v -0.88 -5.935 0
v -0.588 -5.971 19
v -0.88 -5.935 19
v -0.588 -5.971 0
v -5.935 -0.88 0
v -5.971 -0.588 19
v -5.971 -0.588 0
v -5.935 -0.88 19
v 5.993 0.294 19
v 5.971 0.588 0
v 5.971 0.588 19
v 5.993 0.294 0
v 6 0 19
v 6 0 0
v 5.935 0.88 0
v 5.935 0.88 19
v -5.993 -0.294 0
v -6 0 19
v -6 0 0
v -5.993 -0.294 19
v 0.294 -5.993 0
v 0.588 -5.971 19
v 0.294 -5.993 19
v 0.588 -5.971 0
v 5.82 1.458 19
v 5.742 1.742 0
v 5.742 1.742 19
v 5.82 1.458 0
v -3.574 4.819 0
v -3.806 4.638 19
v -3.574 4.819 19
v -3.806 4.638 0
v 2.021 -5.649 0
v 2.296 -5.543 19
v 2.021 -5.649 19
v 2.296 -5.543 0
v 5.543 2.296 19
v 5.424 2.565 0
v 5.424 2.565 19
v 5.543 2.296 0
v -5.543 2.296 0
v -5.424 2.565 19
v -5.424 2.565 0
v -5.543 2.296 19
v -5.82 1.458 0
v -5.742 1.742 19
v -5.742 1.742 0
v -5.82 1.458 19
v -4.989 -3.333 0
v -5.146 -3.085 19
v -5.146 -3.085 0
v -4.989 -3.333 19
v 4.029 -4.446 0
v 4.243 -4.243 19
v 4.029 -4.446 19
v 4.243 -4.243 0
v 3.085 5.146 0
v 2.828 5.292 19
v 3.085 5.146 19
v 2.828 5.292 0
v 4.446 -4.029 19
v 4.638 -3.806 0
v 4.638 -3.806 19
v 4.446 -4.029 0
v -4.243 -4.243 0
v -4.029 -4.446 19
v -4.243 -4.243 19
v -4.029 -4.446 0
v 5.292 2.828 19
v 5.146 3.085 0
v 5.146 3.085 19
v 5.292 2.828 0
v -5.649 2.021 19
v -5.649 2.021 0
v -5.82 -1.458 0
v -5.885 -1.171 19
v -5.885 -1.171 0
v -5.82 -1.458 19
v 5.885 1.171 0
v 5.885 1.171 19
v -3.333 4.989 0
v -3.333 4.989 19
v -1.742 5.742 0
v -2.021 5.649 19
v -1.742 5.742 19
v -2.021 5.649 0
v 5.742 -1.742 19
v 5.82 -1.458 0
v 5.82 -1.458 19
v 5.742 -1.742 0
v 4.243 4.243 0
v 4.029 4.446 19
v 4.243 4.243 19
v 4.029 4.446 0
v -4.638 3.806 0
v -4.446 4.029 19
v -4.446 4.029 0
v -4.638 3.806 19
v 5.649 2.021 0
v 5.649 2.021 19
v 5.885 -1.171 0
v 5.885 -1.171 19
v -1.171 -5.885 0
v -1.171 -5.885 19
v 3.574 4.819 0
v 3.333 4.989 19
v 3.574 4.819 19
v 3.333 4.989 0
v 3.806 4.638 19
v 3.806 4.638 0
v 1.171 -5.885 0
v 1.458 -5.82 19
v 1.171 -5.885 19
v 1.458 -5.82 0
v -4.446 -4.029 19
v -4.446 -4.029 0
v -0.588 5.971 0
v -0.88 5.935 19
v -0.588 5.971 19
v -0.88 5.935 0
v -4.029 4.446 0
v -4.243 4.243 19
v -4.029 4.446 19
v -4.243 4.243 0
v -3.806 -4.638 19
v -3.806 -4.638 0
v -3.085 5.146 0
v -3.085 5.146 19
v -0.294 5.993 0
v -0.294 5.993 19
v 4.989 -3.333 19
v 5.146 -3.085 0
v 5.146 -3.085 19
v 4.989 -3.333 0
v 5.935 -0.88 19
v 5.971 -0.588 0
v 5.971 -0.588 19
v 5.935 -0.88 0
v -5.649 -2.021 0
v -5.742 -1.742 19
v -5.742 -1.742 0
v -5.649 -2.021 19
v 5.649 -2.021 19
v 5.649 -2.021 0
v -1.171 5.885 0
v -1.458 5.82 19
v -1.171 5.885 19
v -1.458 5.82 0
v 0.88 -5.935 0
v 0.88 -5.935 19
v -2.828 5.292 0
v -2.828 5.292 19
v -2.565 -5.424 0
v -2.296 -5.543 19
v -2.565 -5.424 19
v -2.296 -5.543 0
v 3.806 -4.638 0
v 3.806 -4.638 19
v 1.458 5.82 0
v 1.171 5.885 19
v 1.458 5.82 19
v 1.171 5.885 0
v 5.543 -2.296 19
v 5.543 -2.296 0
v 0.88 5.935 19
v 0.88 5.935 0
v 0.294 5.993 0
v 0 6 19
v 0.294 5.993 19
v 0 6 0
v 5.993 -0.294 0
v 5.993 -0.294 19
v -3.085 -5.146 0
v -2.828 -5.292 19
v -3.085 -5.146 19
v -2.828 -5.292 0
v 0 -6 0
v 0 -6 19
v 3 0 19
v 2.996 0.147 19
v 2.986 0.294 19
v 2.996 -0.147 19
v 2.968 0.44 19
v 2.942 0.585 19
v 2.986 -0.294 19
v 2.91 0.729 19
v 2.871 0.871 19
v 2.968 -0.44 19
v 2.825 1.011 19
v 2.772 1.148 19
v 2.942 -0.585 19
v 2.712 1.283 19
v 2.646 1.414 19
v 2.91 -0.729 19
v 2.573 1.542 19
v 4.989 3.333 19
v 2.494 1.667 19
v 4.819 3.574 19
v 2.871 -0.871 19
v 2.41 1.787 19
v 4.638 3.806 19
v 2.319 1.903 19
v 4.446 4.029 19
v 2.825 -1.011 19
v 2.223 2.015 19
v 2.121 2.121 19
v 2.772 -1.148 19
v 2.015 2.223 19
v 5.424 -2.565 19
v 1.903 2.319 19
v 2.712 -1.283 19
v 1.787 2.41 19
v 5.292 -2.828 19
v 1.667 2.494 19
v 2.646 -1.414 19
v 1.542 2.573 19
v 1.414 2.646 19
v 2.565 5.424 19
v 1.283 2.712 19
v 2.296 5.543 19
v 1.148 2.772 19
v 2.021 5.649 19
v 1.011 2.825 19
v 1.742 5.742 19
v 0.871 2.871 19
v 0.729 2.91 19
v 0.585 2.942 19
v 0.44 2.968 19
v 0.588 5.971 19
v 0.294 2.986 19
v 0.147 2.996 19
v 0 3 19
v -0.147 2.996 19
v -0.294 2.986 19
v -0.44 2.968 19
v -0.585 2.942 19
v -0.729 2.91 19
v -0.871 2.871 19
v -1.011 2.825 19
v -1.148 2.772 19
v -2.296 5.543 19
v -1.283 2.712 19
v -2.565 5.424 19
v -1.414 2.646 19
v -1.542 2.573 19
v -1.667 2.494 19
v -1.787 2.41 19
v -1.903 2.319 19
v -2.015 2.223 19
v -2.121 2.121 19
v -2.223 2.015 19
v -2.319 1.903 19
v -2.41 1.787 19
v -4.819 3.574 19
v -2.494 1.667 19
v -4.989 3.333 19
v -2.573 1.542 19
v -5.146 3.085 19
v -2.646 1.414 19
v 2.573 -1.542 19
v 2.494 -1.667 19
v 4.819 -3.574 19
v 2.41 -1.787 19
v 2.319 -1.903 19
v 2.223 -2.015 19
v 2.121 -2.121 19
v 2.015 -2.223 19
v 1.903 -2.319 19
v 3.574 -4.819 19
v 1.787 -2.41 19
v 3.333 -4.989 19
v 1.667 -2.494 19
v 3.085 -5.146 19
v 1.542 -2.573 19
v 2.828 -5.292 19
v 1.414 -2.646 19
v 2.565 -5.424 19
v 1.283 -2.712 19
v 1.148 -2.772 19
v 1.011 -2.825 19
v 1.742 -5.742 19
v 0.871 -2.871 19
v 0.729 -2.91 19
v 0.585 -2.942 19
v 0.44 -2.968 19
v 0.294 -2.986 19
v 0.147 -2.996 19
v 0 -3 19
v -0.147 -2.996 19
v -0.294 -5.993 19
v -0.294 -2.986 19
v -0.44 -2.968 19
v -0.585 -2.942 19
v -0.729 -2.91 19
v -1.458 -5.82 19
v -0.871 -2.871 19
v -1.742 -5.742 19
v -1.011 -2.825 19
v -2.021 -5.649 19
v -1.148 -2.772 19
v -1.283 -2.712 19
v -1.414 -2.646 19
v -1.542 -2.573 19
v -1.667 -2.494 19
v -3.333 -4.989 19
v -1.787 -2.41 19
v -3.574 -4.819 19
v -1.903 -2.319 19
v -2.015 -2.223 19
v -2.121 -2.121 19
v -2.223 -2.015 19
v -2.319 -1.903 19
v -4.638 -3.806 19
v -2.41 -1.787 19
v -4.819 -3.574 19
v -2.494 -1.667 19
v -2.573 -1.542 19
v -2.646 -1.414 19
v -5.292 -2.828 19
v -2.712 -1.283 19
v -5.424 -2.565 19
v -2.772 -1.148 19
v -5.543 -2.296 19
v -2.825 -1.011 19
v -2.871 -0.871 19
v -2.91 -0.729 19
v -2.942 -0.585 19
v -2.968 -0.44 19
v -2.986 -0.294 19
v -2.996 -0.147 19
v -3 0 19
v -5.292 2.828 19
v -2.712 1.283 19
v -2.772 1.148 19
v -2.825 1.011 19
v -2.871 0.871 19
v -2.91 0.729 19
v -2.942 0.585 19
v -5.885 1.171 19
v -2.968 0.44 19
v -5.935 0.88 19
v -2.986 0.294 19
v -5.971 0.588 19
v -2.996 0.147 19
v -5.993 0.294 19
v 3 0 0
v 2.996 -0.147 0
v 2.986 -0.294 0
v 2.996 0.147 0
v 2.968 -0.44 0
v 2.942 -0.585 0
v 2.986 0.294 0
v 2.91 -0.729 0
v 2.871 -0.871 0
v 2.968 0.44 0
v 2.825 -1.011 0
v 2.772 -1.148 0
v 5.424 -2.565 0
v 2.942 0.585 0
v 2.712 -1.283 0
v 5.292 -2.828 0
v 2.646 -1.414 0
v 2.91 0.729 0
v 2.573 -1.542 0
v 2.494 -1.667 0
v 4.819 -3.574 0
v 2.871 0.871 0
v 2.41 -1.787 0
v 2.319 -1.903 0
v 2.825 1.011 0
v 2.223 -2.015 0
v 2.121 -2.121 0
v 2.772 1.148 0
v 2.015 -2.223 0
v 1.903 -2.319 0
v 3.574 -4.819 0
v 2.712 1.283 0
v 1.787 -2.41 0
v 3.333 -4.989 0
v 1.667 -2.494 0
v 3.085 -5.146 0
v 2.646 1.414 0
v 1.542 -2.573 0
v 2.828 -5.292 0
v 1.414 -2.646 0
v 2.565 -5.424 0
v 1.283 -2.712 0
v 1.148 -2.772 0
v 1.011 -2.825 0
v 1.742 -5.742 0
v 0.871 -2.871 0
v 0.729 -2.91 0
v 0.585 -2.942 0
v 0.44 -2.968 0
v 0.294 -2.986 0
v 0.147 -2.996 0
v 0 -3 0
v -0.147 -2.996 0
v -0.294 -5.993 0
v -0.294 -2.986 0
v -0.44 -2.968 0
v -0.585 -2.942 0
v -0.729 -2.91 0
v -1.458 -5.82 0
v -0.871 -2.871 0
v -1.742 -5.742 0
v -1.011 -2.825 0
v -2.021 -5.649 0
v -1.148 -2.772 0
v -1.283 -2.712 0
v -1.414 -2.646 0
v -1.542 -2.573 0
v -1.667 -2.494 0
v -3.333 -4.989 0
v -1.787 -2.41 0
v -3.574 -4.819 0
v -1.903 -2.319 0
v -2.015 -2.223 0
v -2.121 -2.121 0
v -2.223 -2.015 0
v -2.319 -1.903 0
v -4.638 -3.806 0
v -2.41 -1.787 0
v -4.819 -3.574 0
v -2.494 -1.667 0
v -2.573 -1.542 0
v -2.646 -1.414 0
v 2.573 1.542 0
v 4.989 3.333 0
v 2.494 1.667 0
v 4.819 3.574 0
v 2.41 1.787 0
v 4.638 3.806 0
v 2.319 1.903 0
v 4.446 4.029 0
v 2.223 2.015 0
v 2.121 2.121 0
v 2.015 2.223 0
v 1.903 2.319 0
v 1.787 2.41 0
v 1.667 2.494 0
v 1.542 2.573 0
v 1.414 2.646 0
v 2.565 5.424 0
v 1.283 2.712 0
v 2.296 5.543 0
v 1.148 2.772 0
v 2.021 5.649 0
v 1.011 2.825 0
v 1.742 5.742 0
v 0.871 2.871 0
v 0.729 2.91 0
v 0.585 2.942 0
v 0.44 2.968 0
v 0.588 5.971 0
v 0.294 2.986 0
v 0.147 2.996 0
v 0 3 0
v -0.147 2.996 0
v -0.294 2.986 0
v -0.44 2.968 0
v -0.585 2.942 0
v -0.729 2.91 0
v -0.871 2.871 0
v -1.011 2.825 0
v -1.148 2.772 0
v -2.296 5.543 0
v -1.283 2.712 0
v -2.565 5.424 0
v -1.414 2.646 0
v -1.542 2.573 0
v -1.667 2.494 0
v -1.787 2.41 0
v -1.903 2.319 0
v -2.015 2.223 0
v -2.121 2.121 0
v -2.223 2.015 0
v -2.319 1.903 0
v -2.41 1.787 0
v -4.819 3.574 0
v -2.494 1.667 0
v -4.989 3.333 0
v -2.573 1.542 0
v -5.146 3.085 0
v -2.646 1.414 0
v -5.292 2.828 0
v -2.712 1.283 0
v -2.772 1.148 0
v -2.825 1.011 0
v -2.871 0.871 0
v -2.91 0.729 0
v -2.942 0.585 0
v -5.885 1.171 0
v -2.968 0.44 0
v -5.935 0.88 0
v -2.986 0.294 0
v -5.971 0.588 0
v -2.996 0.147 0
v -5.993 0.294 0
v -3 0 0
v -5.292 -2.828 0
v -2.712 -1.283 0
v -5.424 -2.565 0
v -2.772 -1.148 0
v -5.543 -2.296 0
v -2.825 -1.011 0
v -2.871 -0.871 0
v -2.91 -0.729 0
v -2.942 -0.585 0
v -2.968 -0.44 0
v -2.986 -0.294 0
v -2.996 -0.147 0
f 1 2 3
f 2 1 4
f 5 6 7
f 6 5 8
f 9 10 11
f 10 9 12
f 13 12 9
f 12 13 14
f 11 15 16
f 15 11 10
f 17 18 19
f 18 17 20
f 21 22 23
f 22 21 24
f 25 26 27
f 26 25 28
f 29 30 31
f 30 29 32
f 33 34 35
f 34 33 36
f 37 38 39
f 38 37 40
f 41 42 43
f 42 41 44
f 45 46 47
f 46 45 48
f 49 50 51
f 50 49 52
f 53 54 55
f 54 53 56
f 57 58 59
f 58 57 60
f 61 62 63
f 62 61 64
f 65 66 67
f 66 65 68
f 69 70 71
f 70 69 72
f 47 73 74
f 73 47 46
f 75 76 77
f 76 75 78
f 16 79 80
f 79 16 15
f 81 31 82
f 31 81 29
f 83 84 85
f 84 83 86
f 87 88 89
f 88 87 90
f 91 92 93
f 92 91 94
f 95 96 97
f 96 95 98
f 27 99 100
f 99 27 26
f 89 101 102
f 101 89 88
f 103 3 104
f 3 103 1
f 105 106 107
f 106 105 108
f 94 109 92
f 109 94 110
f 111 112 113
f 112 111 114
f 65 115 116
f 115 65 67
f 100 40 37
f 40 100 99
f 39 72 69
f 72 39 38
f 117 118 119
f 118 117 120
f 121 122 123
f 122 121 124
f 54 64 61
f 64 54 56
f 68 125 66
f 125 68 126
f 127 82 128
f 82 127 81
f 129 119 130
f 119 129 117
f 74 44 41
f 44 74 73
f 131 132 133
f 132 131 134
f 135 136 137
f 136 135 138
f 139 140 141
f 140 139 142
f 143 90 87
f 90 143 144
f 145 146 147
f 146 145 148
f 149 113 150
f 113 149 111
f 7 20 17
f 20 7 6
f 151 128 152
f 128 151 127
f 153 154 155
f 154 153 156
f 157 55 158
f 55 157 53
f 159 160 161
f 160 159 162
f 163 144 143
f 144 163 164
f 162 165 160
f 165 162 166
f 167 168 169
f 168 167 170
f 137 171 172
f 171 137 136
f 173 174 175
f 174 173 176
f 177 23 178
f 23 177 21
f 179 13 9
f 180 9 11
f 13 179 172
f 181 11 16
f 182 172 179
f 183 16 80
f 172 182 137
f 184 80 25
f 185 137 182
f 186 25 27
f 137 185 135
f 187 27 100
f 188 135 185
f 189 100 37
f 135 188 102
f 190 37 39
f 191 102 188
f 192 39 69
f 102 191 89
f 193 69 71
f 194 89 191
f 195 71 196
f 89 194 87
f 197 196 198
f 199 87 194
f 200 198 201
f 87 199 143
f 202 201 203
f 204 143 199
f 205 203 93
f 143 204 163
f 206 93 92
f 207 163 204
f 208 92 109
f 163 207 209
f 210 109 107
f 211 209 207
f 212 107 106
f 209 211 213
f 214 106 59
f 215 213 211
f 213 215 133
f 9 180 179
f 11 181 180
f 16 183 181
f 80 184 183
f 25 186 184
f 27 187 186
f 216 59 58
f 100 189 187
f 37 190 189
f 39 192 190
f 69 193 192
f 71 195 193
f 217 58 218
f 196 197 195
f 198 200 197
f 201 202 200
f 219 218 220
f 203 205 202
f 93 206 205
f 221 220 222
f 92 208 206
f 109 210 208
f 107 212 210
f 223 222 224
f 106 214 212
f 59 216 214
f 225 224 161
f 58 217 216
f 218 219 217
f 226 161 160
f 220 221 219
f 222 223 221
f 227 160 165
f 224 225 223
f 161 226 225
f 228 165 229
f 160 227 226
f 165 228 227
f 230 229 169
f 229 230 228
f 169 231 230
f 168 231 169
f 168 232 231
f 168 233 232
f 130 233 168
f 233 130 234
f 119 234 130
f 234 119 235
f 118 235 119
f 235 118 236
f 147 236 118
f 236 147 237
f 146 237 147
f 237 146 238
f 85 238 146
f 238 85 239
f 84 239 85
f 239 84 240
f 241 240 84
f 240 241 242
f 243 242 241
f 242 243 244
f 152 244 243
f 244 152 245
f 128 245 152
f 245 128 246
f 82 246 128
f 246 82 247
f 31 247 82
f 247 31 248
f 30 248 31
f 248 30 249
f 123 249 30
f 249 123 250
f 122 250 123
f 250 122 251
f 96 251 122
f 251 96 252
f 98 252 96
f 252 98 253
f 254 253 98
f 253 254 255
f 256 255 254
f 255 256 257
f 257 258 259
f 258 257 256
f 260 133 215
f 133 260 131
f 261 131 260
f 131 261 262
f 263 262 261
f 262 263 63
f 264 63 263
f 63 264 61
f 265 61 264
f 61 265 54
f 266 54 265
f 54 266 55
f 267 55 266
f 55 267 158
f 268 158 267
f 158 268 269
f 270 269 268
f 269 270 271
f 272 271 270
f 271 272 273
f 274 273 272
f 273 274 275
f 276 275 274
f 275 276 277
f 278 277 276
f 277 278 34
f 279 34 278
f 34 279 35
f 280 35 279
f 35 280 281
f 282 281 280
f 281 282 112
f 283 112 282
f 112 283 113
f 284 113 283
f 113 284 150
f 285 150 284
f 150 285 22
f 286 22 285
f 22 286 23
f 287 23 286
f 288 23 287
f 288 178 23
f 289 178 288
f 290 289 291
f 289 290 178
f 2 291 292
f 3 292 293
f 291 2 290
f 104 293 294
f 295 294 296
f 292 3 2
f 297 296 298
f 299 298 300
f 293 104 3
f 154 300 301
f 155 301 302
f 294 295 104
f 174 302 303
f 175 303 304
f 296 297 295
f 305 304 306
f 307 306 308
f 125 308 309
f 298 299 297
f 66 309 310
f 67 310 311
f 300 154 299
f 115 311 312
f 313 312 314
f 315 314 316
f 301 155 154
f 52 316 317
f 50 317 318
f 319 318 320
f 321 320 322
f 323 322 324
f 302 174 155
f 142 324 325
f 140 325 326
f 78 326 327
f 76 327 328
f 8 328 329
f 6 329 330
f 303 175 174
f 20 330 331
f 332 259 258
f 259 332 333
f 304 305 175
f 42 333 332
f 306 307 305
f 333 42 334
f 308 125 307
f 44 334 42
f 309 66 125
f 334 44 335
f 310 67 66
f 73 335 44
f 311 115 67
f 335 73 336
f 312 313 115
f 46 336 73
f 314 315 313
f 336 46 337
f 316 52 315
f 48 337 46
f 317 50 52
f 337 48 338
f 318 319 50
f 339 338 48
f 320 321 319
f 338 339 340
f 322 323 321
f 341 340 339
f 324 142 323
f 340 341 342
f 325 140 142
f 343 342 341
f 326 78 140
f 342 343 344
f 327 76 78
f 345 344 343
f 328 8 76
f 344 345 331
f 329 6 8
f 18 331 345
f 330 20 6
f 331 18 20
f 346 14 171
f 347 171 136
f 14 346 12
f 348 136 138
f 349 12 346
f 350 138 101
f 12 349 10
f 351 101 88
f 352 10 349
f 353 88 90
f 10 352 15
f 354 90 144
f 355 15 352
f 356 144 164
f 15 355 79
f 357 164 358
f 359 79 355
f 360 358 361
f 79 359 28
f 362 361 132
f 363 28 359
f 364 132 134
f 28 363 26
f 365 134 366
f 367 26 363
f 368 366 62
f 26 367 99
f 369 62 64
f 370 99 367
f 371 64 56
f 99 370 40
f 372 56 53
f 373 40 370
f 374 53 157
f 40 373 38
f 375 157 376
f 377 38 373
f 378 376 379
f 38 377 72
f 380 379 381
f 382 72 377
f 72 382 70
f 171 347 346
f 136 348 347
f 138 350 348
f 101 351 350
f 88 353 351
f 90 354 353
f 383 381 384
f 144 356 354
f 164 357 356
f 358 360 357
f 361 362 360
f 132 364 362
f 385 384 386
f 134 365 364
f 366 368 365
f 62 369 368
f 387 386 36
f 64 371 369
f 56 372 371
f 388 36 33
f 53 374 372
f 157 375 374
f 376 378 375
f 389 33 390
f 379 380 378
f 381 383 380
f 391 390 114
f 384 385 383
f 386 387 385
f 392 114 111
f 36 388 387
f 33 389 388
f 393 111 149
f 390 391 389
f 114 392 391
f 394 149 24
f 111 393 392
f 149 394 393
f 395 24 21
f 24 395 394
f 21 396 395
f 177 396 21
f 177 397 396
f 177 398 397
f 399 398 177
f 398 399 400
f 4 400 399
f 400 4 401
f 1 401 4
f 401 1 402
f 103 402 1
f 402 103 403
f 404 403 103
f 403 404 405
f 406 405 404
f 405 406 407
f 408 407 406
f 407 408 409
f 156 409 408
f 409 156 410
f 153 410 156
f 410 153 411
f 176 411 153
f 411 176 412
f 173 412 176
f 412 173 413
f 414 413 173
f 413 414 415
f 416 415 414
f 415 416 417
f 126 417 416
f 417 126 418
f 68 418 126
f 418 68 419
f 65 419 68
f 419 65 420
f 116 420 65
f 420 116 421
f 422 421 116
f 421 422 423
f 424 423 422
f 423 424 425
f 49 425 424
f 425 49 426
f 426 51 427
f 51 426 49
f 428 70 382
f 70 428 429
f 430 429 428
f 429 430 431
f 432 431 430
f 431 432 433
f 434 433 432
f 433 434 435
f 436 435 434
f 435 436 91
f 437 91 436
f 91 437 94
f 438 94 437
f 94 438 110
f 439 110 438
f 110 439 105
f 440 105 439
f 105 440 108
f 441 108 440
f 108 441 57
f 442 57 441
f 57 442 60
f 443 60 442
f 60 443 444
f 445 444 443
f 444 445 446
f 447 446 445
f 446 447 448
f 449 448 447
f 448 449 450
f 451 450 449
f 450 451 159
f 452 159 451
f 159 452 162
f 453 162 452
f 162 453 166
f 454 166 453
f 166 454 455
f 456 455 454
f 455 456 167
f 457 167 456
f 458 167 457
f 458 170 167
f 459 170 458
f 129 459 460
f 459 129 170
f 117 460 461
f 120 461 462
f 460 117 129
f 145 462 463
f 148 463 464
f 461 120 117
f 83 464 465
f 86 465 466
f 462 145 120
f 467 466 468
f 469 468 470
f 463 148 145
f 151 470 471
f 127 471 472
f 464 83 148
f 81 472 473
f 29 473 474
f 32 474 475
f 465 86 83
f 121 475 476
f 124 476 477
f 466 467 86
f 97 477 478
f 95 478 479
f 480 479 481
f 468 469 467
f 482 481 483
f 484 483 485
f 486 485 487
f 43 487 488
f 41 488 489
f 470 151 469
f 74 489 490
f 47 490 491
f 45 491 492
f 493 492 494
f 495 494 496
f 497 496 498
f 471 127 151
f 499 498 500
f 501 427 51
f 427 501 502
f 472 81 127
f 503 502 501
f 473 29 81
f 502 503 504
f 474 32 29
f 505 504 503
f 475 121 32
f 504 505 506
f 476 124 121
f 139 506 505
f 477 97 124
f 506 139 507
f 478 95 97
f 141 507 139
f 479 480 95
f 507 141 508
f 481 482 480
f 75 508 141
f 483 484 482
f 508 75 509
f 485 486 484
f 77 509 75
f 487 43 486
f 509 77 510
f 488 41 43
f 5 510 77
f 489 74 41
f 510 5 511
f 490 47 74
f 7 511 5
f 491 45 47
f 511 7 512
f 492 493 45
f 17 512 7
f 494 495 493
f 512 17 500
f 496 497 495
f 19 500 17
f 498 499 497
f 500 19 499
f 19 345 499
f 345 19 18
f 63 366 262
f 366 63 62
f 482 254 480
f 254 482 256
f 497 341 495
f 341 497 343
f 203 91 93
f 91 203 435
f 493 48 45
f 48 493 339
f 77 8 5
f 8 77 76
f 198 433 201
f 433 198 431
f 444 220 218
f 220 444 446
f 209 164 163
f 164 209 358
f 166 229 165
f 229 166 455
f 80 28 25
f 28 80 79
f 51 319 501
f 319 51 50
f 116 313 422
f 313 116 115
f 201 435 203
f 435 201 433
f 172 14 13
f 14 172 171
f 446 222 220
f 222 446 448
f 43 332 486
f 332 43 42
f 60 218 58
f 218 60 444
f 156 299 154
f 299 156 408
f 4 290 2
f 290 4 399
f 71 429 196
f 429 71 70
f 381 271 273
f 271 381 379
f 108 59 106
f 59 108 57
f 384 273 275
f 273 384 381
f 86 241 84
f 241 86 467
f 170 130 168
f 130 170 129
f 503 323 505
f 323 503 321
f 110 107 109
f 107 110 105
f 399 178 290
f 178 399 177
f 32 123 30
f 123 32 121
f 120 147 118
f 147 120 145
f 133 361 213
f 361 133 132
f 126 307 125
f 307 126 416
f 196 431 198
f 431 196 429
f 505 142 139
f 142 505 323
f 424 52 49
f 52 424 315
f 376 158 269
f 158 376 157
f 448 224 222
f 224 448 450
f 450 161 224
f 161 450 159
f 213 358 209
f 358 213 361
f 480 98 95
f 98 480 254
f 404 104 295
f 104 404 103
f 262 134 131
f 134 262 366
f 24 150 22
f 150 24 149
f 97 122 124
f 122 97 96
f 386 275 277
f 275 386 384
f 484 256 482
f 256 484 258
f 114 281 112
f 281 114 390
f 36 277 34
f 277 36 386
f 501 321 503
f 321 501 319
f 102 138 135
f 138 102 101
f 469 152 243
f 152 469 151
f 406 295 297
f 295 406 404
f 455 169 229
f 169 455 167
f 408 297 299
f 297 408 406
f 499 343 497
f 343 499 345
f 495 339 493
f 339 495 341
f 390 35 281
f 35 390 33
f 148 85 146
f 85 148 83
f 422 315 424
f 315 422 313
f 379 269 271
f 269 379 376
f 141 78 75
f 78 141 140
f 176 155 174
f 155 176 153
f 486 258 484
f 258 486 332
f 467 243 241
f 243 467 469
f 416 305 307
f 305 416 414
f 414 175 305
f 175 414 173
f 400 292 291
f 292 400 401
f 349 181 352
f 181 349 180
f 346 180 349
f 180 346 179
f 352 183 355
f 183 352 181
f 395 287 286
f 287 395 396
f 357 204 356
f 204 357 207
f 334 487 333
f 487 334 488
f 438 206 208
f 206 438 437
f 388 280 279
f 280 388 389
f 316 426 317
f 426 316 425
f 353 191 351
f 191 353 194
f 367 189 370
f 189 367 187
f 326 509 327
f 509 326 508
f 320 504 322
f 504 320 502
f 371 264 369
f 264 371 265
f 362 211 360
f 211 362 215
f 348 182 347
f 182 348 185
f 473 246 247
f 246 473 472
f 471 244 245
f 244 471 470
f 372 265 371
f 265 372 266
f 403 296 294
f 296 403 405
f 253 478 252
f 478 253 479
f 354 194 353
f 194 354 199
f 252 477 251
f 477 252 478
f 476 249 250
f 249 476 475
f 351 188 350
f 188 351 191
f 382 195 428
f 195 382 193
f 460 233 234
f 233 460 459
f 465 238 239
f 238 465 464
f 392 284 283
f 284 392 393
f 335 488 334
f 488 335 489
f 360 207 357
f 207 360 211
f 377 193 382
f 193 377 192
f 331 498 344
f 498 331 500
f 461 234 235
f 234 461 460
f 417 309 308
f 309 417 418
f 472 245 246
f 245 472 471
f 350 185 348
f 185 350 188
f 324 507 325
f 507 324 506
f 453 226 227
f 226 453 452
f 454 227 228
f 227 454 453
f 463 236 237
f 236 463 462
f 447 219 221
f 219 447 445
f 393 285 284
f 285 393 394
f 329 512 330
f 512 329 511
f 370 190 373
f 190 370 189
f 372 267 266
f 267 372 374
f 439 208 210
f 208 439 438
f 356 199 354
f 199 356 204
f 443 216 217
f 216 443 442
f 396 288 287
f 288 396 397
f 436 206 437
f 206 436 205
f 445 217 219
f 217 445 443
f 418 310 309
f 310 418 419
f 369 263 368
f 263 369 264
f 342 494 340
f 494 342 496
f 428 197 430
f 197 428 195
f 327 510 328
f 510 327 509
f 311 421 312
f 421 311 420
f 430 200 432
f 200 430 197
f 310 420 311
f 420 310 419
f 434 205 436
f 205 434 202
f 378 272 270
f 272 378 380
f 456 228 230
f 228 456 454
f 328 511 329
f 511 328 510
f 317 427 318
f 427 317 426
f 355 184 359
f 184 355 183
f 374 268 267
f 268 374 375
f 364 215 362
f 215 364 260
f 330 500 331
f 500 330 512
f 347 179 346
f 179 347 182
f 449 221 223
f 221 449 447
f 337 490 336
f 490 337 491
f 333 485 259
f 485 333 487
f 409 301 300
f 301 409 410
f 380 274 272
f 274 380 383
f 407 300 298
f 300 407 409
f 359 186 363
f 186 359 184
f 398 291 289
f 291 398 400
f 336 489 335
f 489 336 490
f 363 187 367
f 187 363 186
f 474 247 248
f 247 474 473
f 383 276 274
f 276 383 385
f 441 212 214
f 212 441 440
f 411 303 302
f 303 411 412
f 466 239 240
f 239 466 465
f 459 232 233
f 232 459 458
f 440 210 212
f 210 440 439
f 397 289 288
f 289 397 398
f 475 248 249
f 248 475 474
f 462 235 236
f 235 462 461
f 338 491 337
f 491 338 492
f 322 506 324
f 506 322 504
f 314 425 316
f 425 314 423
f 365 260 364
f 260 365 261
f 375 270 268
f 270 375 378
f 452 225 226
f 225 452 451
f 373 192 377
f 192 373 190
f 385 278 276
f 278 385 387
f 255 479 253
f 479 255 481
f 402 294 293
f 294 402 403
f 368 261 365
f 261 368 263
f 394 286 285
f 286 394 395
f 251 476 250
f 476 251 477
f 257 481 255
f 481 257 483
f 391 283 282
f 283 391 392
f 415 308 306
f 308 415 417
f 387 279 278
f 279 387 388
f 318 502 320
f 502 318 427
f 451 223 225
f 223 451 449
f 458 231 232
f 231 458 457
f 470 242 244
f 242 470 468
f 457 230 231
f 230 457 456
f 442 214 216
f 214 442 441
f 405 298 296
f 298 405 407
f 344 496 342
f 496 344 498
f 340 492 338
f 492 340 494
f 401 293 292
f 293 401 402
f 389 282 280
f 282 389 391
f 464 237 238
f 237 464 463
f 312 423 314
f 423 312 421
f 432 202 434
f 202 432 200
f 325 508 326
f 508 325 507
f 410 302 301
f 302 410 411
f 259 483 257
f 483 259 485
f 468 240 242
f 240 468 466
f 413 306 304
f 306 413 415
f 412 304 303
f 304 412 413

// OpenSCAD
$fn = 128;

bore_d = 6.0;
outer_d = 12.0;
length = 19.0;

difference() {
  cylinder(d = outer_d, h = length, center = false);
  translate([0, 0, -0.1])
    cylinder(d = bore_d, h = length + 0.2, center = false);
}
